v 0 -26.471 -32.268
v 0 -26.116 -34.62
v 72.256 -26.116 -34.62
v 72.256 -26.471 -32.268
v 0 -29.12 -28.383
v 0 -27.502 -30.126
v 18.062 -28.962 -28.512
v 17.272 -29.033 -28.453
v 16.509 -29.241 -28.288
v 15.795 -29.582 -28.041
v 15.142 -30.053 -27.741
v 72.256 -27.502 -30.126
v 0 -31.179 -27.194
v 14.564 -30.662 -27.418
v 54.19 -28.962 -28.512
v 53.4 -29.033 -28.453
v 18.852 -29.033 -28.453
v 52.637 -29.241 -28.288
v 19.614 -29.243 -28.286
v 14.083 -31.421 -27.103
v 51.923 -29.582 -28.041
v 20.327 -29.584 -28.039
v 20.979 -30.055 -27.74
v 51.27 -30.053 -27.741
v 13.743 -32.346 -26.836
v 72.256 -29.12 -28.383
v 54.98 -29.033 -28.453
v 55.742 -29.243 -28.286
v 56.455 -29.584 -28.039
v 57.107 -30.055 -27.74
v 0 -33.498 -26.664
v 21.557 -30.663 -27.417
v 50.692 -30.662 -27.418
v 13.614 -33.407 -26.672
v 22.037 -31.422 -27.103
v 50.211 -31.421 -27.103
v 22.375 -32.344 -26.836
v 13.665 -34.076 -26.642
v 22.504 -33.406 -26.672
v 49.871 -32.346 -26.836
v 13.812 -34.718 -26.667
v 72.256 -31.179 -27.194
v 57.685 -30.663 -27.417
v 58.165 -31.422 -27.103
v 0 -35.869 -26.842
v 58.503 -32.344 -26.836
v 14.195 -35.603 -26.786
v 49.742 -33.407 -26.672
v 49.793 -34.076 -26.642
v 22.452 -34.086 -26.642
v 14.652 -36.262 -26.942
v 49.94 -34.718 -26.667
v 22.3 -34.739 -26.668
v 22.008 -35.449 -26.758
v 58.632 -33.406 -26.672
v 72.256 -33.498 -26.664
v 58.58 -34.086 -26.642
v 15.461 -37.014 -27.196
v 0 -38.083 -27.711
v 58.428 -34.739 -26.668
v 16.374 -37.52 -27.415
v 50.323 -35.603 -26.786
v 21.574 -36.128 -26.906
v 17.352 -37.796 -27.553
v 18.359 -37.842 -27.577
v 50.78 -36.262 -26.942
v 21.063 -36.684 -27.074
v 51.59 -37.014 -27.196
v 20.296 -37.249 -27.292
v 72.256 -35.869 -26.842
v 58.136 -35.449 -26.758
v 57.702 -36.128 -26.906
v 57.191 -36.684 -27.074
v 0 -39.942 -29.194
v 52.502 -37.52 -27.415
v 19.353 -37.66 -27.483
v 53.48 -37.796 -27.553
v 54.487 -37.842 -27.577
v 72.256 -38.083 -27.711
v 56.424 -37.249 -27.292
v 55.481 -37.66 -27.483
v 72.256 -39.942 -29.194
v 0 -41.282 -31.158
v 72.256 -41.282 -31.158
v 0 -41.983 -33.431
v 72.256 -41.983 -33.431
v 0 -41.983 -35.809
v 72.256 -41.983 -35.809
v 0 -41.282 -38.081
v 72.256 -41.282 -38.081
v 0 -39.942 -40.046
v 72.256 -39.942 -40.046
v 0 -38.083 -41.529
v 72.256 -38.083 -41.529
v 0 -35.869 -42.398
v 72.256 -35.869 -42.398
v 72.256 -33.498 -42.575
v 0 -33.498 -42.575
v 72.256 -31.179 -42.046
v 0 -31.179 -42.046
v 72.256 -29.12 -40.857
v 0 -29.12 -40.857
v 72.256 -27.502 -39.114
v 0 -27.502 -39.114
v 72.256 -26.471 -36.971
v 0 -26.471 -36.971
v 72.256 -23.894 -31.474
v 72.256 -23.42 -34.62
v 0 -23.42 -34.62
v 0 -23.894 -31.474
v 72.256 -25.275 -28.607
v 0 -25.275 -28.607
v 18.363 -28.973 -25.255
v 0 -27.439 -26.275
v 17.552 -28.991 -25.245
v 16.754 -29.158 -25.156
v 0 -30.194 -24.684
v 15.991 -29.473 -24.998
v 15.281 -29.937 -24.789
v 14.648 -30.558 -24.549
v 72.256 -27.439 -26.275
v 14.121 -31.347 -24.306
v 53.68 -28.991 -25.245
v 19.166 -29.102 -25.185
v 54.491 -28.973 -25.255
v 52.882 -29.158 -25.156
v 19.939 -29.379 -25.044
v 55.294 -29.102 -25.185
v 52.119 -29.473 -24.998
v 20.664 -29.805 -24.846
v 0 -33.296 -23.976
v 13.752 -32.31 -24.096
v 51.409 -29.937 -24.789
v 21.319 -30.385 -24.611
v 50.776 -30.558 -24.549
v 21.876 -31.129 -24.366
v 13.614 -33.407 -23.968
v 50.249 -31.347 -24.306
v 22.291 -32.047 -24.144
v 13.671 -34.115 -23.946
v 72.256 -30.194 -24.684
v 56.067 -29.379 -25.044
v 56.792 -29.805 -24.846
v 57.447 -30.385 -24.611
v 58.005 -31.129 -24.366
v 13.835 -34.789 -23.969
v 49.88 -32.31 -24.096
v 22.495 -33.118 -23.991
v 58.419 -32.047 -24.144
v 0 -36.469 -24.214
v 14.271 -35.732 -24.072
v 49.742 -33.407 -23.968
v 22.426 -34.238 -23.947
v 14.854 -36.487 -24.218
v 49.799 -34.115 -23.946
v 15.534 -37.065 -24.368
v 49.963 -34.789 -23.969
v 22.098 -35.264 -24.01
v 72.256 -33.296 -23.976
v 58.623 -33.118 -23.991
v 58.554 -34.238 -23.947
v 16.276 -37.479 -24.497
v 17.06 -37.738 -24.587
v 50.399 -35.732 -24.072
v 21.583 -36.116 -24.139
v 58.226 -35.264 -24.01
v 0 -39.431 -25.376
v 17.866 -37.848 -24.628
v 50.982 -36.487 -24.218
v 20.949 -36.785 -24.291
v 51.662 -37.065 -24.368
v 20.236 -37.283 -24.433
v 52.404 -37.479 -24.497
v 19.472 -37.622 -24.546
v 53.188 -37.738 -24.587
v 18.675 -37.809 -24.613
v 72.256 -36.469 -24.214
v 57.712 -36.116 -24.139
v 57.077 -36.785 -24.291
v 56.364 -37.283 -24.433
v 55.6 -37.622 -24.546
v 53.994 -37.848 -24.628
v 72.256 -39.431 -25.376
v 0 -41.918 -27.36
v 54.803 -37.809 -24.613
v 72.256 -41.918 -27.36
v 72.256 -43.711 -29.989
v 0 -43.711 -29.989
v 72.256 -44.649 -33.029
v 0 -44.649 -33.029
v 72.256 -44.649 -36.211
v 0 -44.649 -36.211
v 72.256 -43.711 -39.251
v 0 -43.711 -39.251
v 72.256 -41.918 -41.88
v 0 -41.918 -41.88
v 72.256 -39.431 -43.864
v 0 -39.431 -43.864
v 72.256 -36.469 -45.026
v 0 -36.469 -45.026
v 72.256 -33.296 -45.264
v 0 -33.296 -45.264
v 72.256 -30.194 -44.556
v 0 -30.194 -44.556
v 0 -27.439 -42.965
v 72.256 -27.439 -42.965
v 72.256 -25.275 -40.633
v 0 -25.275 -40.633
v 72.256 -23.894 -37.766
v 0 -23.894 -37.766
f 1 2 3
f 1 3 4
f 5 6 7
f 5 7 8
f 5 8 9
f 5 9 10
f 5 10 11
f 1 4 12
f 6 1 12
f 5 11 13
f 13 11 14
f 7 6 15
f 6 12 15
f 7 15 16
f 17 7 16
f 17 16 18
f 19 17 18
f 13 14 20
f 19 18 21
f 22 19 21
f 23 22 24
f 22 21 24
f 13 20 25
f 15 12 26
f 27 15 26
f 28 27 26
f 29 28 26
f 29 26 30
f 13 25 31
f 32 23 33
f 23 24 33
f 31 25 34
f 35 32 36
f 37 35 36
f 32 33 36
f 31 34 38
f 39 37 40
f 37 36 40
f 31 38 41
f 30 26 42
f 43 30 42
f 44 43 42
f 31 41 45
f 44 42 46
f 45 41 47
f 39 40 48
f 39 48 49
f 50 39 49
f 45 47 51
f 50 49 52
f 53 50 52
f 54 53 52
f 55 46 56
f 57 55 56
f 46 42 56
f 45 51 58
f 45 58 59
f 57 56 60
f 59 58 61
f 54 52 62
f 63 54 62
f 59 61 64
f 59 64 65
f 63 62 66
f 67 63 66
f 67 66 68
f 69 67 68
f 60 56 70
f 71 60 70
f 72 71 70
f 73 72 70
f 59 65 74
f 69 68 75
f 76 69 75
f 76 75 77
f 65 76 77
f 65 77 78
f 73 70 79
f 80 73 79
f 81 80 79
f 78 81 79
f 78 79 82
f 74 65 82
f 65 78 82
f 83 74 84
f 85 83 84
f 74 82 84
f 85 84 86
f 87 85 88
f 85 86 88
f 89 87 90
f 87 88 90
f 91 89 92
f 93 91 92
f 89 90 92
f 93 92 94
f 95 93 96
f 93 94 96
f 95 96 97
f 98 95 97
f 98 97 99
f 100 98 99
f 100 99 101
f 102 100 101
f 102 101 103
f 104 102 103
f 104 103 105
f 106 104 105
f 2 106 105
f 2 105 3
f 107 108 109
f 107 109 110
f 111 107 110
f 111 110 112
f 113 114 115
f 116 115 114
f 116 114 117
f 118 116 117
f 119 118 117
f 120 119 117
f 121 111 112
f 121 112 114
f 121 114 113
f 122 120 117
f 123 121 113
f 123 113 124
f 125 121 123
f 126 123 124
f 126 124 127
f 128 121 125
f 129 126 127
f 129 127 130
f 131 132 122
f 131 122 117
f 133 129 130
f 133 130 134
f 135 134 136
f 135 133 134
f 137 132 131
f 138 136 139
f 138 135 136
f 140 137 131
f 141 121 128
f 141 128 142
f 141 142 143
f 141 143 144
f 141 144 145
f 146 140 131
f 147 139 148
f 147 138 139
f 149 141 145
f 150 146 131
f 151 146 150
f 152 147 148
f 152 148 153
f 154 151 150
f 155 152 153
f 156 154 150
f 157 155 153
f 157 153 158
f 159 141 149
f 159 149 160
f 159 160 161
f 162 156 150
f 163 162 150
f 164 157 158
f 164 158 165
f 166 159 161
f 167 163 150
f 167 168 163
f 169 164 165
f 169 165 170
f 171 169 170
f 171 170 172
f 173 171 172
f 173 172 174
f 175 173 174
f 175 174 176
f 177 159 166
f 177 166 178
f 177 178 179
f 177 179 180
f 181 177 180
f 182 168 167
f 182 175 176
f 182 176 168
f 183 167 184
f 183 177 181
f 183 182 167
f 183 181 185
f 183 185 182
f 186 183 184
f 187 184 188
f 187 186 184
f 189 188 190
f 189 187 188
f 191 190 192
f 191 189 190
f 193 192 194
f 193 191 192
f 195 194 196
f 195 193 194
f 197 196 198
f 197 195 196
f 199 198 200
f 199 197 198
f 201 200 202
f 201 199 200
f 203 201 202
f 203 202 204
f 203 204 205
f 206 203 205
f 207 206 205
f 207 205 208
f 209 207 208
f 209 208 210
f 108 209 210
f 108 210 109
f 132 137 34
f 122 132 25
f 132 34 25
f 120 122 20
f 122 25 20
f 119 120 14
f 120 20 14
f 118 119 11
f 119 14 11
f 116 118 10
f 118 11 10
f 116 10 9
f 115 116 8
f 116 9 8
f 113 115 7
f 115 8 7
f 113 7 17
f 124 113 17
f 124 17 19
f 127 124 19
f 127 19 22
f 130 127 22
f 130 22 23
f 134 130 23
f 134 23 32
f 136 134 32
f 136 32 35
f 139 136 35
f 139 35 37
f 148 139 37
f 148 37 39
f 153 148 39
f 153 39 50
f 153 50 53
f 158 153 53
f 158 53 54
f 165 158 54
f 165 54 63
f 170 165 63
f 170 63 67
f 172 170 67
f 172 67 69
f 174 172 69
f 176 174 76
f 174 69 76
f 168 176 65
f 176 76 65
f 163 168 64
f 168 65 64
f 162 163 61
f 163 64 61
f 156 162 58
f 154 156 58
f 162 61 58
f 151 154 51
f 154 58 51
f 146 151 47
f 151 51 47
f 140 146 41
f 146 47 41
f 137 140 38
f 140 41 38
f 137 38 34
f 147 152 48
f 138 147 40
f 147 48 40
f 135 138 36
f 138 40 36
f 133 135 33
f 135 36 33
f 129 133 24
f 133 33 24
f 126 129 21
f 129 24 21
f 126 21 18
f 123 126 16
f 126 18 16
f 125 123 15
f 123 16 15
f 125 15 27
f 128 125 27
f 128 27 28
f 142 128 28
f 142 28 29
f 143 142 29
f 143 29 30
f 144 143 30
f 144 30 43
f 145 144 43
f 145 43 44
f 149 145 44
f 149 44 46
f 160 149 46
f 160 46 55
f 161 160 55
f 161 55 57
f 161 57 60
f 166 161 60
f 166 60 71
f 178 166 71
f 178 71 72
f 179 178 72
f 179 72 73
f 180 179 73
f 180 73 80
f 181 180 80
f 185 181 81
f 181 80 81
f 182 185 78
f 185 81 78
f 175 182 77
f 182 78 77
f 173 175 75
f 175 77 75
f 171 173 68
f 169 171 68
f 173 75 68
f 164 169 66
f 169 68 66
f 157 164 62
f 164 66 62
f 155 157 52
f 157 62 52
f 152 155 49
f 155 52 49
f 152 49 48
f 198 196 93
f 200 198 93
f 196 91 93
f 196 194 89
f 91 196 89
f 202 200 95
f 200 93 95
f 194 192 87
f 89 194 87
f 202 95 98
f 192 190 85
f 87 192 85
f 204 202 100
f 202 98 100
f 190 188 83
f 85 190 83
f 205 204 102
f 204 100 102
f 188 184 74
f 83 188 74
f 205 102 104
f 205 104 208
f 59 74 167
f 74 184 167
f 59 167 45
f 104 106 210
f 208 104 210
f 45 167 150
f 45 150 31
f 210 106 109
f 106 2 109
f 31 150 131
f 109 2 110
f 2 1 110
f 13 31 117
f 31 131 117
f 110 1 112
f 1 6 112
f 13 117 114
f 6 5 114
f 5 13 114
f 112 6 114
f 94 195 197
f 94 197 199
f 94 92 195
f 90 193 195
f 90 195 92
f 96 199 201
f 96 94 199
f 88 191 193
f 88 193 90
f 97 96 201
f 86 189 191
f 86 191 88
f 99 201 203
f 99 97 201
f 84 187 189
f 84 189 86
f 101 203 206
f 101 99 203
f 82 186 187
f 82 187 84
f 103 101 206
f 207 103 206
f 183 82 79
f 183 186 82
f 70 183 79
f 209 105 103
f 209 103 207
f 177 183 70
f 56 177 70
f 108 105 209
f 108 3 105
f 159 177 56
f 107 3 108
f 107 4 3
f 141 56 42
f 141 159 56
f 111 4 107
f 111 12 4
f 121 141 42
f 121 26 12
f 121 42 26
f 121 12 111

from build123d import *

# Parameters (mm, degrees)
F0_W     = 25.4
F0_H     = 25.4
F1_DEPTH = 72.25612
F2_R     = 7.977786
F3_DEPTH = 82.87319
F5_D     = 8.89
F5_DEPTH = 12.7
F2_W     = 25.4
F2_H     = 25.4
F2_R_2   = 10.673918
F6_DEPTH = 88.86488


with BuildPart() as f1:
    # F0 (on Right) → F1 (new body)
    with BuildSketch(Plane.YZ):
        with Locations((-33.407167, -34.459156)):
            Rectangle(F0_W, F0_H)
    extrude(amount=F1_DEPTH)

    # F2 (on face) → F3 (cut)
    with BuildSketch(Plane.YZ.offset(72.25612)):
        with Locations((-34.093928, -34.619924)):
            Circle(F2_R)
    extrude(amount=-F3_DEPTH, mode=Mode.SUBTRACT)

    # F5
    with Locations(Plane.XY.offset(-21.759156)):
        with Locations((18.0594, -33.407167), (54.18746, -33.407167)):
            Hole(F5_D / 2, depth=F5_DEPTH)

    # F2 (on face) → F6 (cut)
    with BuildSketch(Plane.YZ.offset(72.25612)):
        with Locations((-33.407167, -34.459156)):
            Rectangle(F2_W, F2_H)
        with Locations((-34.093928, -34.619924)):
            Circle(F2_R_2, mode=Mode.SUBTRACT)
    extrude(amount=-F6_DEPTH, mode=Mode.SUBTRACT)


solid = f1.part
